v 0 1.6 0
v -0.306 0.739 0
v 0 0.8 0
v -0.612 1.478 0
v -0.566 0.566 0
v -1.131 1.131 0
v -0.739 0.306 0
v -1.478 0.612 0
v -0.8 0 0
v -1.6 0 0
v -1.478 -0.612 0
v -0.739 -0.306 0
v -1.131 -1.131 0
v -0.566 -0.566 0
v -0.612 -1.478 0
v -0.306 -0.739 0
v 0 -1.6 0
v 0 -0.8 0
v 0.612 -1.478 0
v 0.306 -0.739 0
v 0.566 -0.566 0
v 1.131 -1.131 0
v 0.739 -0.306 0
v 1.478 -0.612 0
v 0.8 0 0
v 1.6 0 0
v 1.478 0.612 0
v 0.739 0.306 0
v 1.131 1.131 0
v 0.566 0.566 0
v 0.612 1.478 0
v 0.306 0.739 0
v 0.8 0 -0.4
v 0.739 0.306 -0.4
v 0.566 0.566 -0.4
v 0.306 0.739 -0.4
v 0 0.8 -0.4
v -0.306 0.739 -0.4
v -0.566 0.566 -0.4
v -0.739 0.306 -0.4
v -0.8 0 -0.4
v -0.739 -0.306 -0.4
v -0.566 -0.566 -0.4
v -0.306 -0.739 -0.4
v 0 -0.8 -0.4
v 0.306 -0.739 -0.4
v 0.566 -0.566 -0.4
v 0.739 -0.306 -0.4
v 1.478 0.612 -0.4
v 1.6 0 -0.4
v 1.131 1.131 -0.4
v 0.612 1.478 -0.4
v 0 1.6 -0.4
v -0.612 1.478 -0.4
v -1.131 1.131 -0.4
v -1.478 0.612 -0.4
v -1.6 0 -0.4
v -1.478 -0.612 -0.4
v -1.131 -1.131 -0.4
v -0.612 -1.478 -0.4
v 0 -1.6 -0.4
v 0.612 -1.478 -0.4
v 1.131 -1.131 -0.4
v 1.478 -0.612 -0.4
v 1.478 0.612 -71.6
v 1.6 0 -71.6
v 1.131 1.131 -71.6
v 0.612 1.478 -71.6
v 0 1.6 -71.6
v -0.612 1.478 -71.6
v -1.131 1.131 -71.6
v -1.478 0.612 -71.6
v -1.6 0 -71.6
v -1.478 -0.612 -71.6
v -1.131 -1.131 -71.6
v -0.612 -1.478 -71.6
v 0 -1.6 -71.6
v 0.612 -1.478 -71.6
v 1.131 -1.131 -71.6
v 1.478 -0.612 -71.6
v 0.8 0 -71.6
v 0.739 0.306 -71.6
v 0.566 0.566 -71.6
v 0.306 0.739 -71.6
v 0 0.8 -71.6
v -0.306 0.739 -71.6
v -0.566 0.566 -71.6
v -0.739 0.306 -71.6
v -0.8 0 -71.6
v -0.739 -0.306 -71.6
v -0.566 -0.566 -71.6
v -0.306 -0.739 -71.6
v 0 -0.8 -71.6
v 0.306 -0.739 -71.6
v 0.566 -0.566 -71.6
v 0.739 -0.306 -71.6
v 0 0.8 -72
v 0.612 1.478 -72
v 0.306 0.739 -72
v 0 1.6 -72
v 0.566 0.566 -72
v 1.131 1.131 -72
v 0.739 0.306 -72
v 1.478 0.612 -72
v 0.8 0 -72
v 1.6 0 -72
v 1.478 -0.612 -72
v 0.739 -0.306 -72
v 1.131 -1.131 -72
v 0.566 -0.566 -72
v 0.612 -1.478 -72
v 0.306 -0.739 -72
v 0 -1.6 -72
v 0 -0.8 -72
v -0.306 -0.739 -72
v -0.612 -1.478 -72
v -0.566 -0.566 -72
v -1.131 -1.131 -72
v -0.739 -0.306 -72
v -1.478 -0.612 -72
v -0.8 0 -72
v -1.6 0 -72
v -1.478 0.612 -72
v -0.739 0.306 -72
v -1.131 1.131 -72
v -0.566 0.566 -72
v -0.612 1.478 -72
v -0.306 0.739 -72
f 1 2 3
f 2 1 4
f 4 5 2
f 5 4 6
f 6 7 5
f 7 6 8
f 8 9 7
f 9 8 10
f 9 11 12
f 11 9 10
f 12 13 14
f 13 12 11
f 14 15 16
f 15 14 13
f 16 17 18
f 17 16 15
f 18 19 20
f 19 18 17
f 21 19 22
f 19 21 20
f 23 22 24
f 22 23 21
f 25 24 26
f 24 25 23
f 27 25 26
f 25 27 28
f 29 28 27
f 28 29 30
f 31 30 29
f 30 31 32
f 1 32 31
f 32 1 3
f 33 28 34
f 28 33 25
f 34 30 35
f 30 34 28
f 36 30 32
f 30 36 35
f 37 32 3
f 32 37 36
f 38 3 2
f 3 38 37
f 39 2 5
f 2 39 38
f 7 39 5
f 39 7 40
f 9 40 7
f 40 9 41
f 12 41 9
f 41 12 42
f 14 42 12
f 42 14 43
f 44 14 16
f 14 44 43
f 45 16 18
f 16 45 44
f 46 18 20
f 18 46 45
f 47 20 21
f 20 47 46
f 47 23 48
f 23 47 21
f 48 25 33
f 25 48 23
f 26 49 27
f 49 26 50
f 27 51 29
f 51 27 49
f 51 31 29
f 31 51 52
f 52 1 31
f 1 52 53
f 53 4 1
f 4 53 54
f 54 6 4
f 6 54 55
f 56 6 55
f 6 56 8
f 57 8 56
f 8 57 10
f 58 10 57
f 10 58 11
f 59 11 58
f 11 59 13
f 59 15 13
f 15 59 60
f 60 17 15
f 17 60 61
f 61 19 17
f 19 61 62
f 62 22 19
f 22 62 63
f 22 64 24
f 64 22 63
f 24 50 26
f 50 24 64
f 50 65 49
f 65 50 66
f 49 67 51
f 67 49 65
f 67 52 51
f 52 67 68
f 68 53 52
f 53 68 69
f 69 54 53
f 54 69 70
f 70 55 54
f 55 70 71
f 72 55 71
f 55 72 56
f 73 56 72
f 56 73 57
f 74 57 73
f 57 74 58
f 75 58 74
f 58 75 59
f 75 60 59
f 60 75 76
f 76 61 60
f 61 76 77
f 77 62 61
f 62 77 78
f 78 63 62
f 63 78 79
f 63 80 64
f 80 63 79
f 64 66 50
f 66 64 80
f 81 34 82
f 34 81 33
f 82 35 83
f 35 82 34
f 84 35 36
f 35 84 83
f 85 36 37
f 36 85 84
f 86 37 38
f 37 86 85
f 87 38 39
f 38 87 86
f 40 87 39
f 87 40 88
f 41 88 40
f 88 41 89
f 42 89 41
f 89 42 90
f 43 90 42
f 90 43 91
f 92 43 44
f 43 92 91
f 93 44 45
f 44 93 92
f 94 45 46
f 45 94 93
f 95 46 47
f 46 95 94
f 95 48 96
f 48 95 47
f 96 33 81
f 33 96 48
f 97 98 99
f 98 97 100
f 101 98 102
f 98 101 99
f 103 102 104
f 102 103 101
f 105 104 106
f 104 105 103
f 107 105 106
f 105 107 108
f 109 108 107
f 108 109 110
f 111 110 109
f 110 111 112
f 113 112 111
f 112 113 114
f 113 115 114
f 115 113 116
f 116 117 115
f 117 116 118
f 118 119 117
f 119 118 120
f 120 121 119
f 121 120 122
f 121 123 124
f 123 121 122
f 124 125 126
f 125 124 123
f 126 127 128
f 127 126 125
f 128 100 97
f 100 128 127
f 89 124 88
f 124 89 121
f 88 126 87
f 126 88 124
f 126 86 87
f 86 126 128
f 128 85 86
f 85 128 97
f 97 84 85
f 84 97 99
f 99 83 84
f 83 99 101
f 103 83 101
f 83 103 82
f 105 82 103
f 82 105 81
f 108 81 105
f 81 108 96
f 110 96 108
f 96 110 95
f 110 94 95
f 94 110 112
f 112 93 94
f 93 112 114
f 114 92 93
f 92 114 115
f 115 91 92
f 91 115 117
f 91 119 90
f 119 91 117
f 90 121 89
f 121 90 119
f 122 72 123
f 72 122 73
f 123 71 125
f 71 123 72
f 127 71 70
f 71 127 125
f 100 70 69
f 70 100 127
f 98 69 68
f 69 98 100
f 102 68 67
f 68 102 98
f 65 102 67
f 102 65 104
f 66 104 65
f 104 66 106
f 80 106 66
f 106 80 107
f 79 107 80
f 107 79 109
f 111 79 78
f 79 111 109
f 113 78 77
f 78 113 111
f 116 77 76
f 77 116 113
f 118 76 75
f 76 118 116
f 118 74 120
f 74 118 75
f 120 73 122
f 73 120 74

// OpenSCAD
// file: ../p/4-4ring1.scad
use <../lib.scad>
function ldraw_lib__4_4ring1() = [
// 0 Ring  1 x 1.0
// 0 Name: 4-4ring1.dat
// 0 Author: James Jessiman
// 0 !LDRAW_ORG Primitive UPDATE 2009-01
// 0 !LICENSE Licensed under CC BY 2.0 and CC BY 4.0 : see CAreadme.txt
// 
// 0 BFC CERTIFY CCW
  [0,"BFC","CERTIFY"],
  [0,"BFC","CCW"],
// 
// 0 !HISTORY 1998-12-15 [PTadmin] Official Update 1998-10
// 0 !HISTORY 2002-04-08 [BrickCaster] Modified for BFC compliance
// 0 !HISTORY 2002-04-25 [PTadmin] Official Update 2002-02
// 0 !HISTORY 2007-06-24 [PTadmin] Header formatted for Contributor Agreement
// 0 !HISTORY 2008-07-01 [PTadmin] Official Update 2008-01
// 0 !HISTORY 2008-08-26 [cwdee] Switch polygon winding and rename
// 0 !HISTORY 2009-05-02 [PTadmin] Official Update 2009-01
// 
// 
// 4 16 -0.7654 0 1.8478 -0.3827 0 0.9239 0 0 1 0 0 2
  [4,16,-0.7654,0,1.8478,-0.3827,0,0.9239,0,0,1,0,0,2],
// 4 16 -1.4142 0 1.4142 -0.7071 0 0.7071 -0.3827 0 0.9239 -0.7654 0 1.8478
  [4,16,-1.4142,0,1.4142,-0.7071,0,0.7071,-0.3827,0,0.9239,-0.7654,0,1.8478],
// 4 16 -1.8478 0 0.7654 -0.9239 0 0.3827 -0.7071 0 0.7071 -1.4142 0 1.41420
  [4,16,-1.8478,0,0.7654,-0.9239,0,0.3827,-0.7071,0,0.7071,-1.4142,0,1.41420],
// 4 16 -2 0 0 -1 0 0 -0.9239 0 0.3827 -1.8478 0 0.7654
  [4,16,-2,0,0,-1,0,0,-0.9239,0,0.3827,-1.8478,0,0.7654],
// 4 16 -1.8478 0 -0.7654 -0.9239 0 -0.3827 -1 0 0 -2 0 0
  [4,16,-1.8478,0,-0.7654,-0.9239,0,-0.3827,-1,0,0,-2,0,0],
// 4 16 -1.4142 0 -1.4142 -0.7071 0 -0.7071 -0.9239 0 -0.3827 -1.8478 0 -0.7654
  [4,16,-1.4142,0,-1.4142,-0.7071,0,-0.7071,-0.9239,0,-0.3827,-1.8478,0,-0.7654],
// 4 16 -0.7654 0 -1.8478 -0.3827 0 -0.9239 -0.7071 0 -0.7071 -1.4142 0 -1.4142
  [4,16,-0.7654,0,-1.8478,-0.3827,0,-0.9239,-0.7071,0,-0.7071,-1.4142,0,-1.4142],
// 4 16 0 0 -2 0 0 -1 -0.3827 0 -0.9239 -0.7654 0 -1.8478
  [4,16,0,0,-2,0,0,-1,-0.3827,0,-0.9239,-0.7654,0,-1.8478],
// 4 16 0.7654 0 -1.8478 0.3827 0 -0.9239 0 0 -1 0 0 -2
  [4,16,0.7654,0,-1.8478,0.3827,0,-0.9239,0,0,-1,0,0,-2],
// 4 16 1.4142 0 -1.4142 0.7071 0 -0.7071 0.3827 0 -0.9239 0.7654 0 -1.8478
  [4,16,1.4142,0,-1.4142,0.7071,0,-0.7071,0.3827,0,-0.9239,0.7654,0,-1.8478],
// 4 16 1.8478 0 -0.7654 0.9239 0 -0.3827 0.7071 0 -0.7071 1.4142 0 -1.4142
  [4,16,1.8478,0,-0.7654,0.9239,0,-0.3827,0.7071,0,-0.7071,1.4142,0,-1.4142],
// 4 16 2 0 0 1 0 0 0.9239 0 -0.3827 1.8478 0 -0.7654
  [4,16,2,0,0,1,0,0,0.9239,0,-0.3827,1.8478,0,-0.7654],
// 4 16 1.8478 0 0.7654 0.9239 0 0.3827 1 0 0 2 0 0
  [4,16,1.8478,0,0.7654,0.9239,0,0.3827,1,0,0,2,0,0],
// 4 16 1.4142 0 1.4142 0.7071 0 0.7071 0.9239 0 0.3827 1.8478 0 0.7654
  [4,16,1.4142,0,1.4142,0.7071,0,0.7071,0.9239,0,0.3827,1.8478,0,0.7654],
// 4 16 0.7654 0 1.8478 0.3827 0 0.9239 0.7071 0 0.7071 1.4142 0 1.4142
  [4,16,0.7654,0,1.8478,0.3827,0,0.9239,0.7071,0,0.7071,1.4142,0,1.4142],
// 4 16 0 0 2 0 0 1 0.3827 0 0.9239 0.7654 0 1.8478
  [4,16,0,0,2,0,0,1,0.3827,0,0.9239,0.7654,0,1.8478],
// 0
];
module ldraw_lib__4_4ring1(step=0, col=false, unit=2/5, alt=false, line=0.2, solid=!$preview)
    makepoly(ldraw_lib__4_4ring1(), step=step, col=col, unit=unit, alt=alt, line=line, solid=solid);
ldraw_lib__4_4ring1(line=0.2);
// file: ../p/4-4edge.scad
use <../lib.scad>
function ldraw_lib__4_4edge() = [
// 0 Circle 1.0
// 0 Name: 4-4edge.dat
// 0 Author: James Jessiman
// 0 !LDRAW_ORG Primitive UPDATE 2017-01
// 0 !LICENSE Licensed under CC BY 2.0 and CC BY 4.0 : see CAreadme.txt
// 
// 0 BFC CERTIFY CCW
  [0,"BFC","CERTIFY"],
  [0,"BFC","CCW"],
// 
// 0 !HISTORY 1998-12-15 [PTadmin] Official Update 1998-10
// 0 !HISTORY 2005-12-28 [PTadmin] Official Update 2005-01
// 0 !HISTORY 2007-06-24 [PTadmin] Header formatted for Contributor Agreement
// 0 !HISTORY 2008-07-01 [PTadmin] Official Update 2008-01
// 0 !HISTORY 2017-01-15 [Steffen] BFCed
// 0 !HISTORY 2017-12-30 [PTadmin] Official Update 2017-01
// 
// 
// 2 24 1 0 0 0.9239 0 0.3827
  [2,24,1,0,0,0.9239,0,0.3827],
// 2 24 0.9239 0 0.3827 0.7071 0 0.7071
  [2,24,0.9239,0,0.3827,0.7071,0,0.7071],
// 2 24 0.7071 0 0.7071 0.3827 0 0.9239
  [2,24,0.7071,0,0.7071,0.3827,0,0.9239],
// 2 24 0.3827 0 0.9239 0 0 1
  [2,24,0.3827,0,0.9239,0,0,1],
// 2 24 0 0 1 -0.3827 0 0.9239
  [2,24,0,0,1,-0.3827,0,0.9239],
// 2 24 -0.3827 0 0.9239 -0.7071 0 0.7071
  [2,24,-0.3827,0,0.9239,-0.7071,0,0.7071],
// 2 24 -0.7071 0 0.7071 -0.9239 0 0.3827
  [2,24,-0.7071,0,0.7071,-0.9239,0,0.3827],
// 2 24 -0.9239 0 0.3827 -1 0 -0
  [2,24,-0.9239,0,0.3827,-1,0,-0],
// 2 24 -1 0 -0 -0.9239 0 -0.3827
  [2,24,-1,0,-0,-0.9239,0,-0.3827],
// 2 24 -0.9239 0 -0.3827 -0.7071 0 -0.7071
  [2,24,-0.9239,0,-0.3827,-0.7071,0,-0.7071],
// 2 24 -0.7071 0 -0.7071 -0.3827 0 -0.9239
  [2,24,-0.7071,0,-0.7071,-0.3827,0,-0.9239],
// 2 24 -0.3827 0 -0.9239 0 0 -1
  [2,24,-0.3827,0,-0.9239,0,0,-1],
// 2 24 0 0 -1 0.3827 0 -0.9239
  [2,24,0,0,-1,0.3827,0,-0.9239],
// 2 24 0.3827 0 -0.9239 0.7071 0 -0.7071
  [2,24,0.3827,0,-0.9239,0.7071,0,-0.7071],
// 2 24 0.7071 0 -0.7071 0.9239 0 -0.3827
  [2,24,0.7071,0,-0.7071,0.9239,0,-0.3827],
// 2 24 0.9239 0 -0.3827 1 0 0
  [2,24,0.9239,0,-0.3827,1,0,0],
];
module ldraw_lib__4_4edge(step=0, col=false, unit=2/5, alt=false, line=0.2, solid=!$preview)
    makepoly(ldraw_lib__4_4edge(), step=step, col=col, unit=unit, alt=alt, line=line, solid=solid);
ldraw_lib__4_4edge(line=0.2);
// file: ../p/4-4cyli.scad
use <../lib.scad>
function ldraw_lib__4_4cyli() = [
// 0 Cylinder 1.0
// 0 Name: 4-4cyli.dat
// 0 Author: James Jessiman
// 0 !LDRAW_ORG Primitive UPDATE 2005-01
// 0 !LICENSE Licensed under CC BY 2.0 and CC BY 4.0 : see CAreadme.txt
// 
// 0 BFC CERTIFY CCW
  [0,"BFC","CERTIFY"],
  [0,"BFC","CCW"],
// 
// 0 !HISTORY 1998-12-15 [PTadmin] Official Update 1998-10
// 0 !HISTORY 2002-03-23 [sbliss] Added BFC statement; merged headers from files in distributions LDraw 0.27 and Complete.
// 0 !HISTORY 2002-04-25 [PTadmin] Official Update 2002-02
// 0 !HISTORY 2004-12-14 [guyvivan] BFC CCW
// 0 !HISTORY 2005-12-28 [PTadmin] Official Update 2005-01
// 0 !HISTORY 2007-06-24 [PTadmin] Header formatted for Contributor Agreement
// 0 !HISTORY 2008-07-01 [PTadmin] Official Update 2008-01
// 
// 
// 4 16 1 1 0 0.9239 1 0.3827 0.9239 0 0.3827 1 0 0
  [4,16,1,1,0,0.9239,1,0.3827,0.9239,0,0.3827,1,0,0],
// 5 24 1 0 0 1 1 0 0.9239 0 0.3827 0.9239 0 -0.3827
  [5,24,1,0,0,1,1,0,0.9239,0,0.3827,0.9239,0,-0.3827],
// 4 16 0.9239 1 0.3827 0.7071 1 0.7071 0.7071 0 0.7071 0.9239 0 0.3827
  [4,16,0.9239,1,0.3827,0.7071,1,0.7071,0.7071,0,0.7071,0.9239,0,0.3827],
// 5 24 0.9239 0 0.3827 0.9239 1 0.3827 0.7071 0 0.7071 1 0 0
  [5,24,0.9239,0,0.3827,0.9239,1,0.3827,0.7071,0,0.7071,1,0,0],
// 4 16 0.7071 1 0.7071 0.3827 1 0.9239 0.3827 0 0.9239 0.7071 0 0.7071
  [4,16,0.7071,1,0.7071,0.3827,1,0.9239,0.3827,0,0.9239,0.7071,0,0.7071],
// 5 24 0.7071 0 0.7071 0.7071 1 0.7071 0.3827 0 0.9239 0.9239 0 0.3827
  [5,24,0.7071,0,0.7071,0.7071,1,0.7071,0.3827,0,0.9239,0.9239,0,0.3827],
// 4 16 0.3827 1 0.9239 0 1 1 0 0 1 0.3827 0 0.9239
  [4,16,0.3827,1,0.9239,0,1,1,0,0,1,0.3827,0,0.9239],
// 5 24 0.3827 0 0.9239 0.3827 1 0.9239 0 0 1 0.7071 0 0.7071
  [5,24,0.3827,0,0.9239,0.3827,1,0.9239,0,0,1,0.7071,0,0.7071],
// 4 16 0 1 1 -0.3827 1 0.9239 -0.3827 0 0.9239 0 0 1
  [4,16,0,1,1,-0.3827,1,0.9239,-0.3827,0,0.9239,0,0,1],
// 5 24 0 0 1 0 1 1 -0.3827 0 0.9239 0.3827 0 0.9239
  [5,24,0,0,1,0,1,1,-0.3827,0,0.9239,0.3827,0,0.9239],
// 4 16 -0.3827 1 0.9239 -0.7071 1 0.7071 -0.7071 0 0.7071 -0.3827 0 0.9239
  [4,16,-0.3827,1,0.9239,-0.7071,1,0.7071,-0.7071,0,0.7071,-0.3827,0,0.9239],
// 5 24 -0.3827 0 0.9239 -0.3827 1 0.9239 -0.7071 0 0.7071 0 0 1
  [5,24,-0.3827,0,0.9239,-0.3827,1,0.9239,-0.7071,0,0.7071,0,0,1],
// 4 16 -0.7071 1 0.7071 -0.9239 1 0.3827 -0.9239 0 0.3827 -0.7071 0 0.7071
  [4,16,-0.7071,1,0.7071,-0.9239,1,0.3827,-0.9239,0,0.3827,-0.7071,0,0.7071],
// 5 24 -0.7071 0 0.7071 -0.7071 1 0.7071 -0.9239 0 0.3827 -0.3827 0 0.9239
  [5,24,-0.7071,0,0.7071,-0.7071,1,0.7071,-0.9239,0,0.3827,-0.3827,0,0.9239],
// 4 16 -0.9239 1 0.3827 -1 1 0 -1 0 0 -0.9239 0 0.3827
  [4,16,-0.9239,1,0.3827,-1,1,0,-1,0,0,-0.9239,0,0.3827],
// 5 24 -0.9239 0 0.3827 -0.9239 1 0.3827 -1 0 0 -0.7071 0 0.7071
  [5,24,-0.9239,0,0.3827,-0.9239,1,0.3827,-1,0,0,-0.7071,0,0.7071],
// 4 16 -1 1 0 -0.9239 1 -0.3827 -0.9239 0 -0.3827 -1 0 0
  [4,16,-1,1,0,-0.9239,1,-0.3827,-0.9239,0,-0.3827,-1,0,0],
// 5 24 -1 0 0 -1 1 0 -0.9239 0 -0.3827 -0.9239 0 0.3827
  [5,24,-1,0,0,-1,1,0,-0.9239,0,-0.3827,-0.9239,0,0.3827],
// 4 16 -0.9239 1 -0.3827 -0.7071 1 -0.7071 -0.7071 0 -0.7071 -0.9239 0 -0.3827
  [4,16,-0.9239,1,-0.3827,-0.7071,1,-0.7071,-0.7071,0,-0.7071,-0.9239,0,-0.3827],
// 5 24 -0.9239 0 -0.3827 -0.9239 1 -0.3827 -0.7071 0 -0.7071 -1 0 0
  [5,24,-0.9239,0,-0.3827,-0.9239,1,-0.3827,-0.7071,0,-0.7071,-1,0,0],
// 4 16 -0.7071 1 -0.7071 -0.3827 1 -0.9239 -0.3827 0 -0.9239 -0.7071 0 -0.7071
  [4,16,-0.7071,1,-0.7071,-0.3827,1,-0.9239,-0.3827,0,-0.9239,-0.7071,0,-0.7071],
// 5 24 -0.7071 0 -0.7071 -0.7071 1 -0.7071 -0.3827 0 -0.9239 -0.9239 0 -0.3827
  [5,24,-0.7071,0,-0.7071,-0.7071,1,-0.7071,-0.3827,0,-0.9239,-0.9239,0,-0.3827],
// 4 16 -0.3827 1 -0.9239 0 1 -1 0 0 -1 -0.3827 0 -0.9239
  [4,16,-0.3827,1,-0.9239,0,1,-1,0,0,-1,-0.3827,0,-0.9239],
// 5 24 -0.3827 0 -0.9239 -0.3827 1 -0.9239 0 0 -1 -0.7071 0 -0.7071
  [5,24,-0.3827,0,-0.9239,-0.3827,1,-0.9239,0,0,-1,-0.7071,0,-0.7071],
// 4 16 0 1 -1 0.3827 1 -0.9239 0.3827 0 -0.9239 0 0 -1
  [4,16,0,1,-1,0.3827,1,-0.9239,0.3827,0,-0.9239,0,0,-1],
// 5 24 0 0 -1 0 1 -1 0.3827 0 -0.9239 -0.3827 0 -0.9239
  [5,24,0,0,-1,0,1,-1,0.3827,0,-0.9239,-0.3827,0,-0.9239],
// 4 16 0.3827 1 -0.9239 0.7071 1 -0.7071 0.7071 0 -0.7071 0.3827 0 -0.9239
  [4,16,0.3827,1,-0.9239,0.7071,1,-0.7071,0.7071,0,-0.7071,0.3827,0,-0.9239],
// 5 24 0.3827 0 -0.9239 0.3827 1 -0.9239 0.7071 0 -0.7071 0 0 -1
  [5,24,0.3827,0,-0.9239,0.3827,1,-0.9239,0.7071,0,-0.7071,0,0,-1],
// 4 16 0.7071 1 -0.7071 0.9239 1 -0.3827 0.9239 0 -0.3827 0.7071 0 -0.7071
  [4,16,0.7071,1,-0.7071,0.9239,1,-0.3827,0.9239,0,-0.3827,0.7071,0,-0.7071],
// 5 24 0.7071 0 -0.7071 0.7071 1 -0.7071 0.9239 0 -0.3827 0.3827 0 -0.9239
  [5,24,0.7071,0,-0.7071,0.7071,1,-0.7071,0.9239,0,-0.3827,0.3827,0,-0.9239],
// 4 16 0.9239 1 -0.3827 1 1 0 1 0 0 0.9239 0 -0.3827
  [4,16,0.9239,1,-0.3827,1,1,0,1,0,0,0.9239,0,-0.3827],
// 5 24 0.9239 0 -0.3827 0.9239 1 -0.3827 1 0 0 0.7071 0 -0.7071
  [5,24,0.9239,0,-0.3827,0.9239,1,-0.3827,1,0,0,0.7071,0,-0.7071],
// 0
];
module ldraw_lib__4_4cyli(step=0, col=false, unit=2/5, alt=false, line=0.2, solid=!$preview)
    makepoly(ldraw_lib__4_4cyli(), step=step, col=col, unit=unit, alt=alt, line=line, solid=solid);
ldraw_lib__4_4cyli(line=0.2);
// file: u9053.scad
use <../lib.scad>
use <../p/4-4cyli.scad>
use <../p/4-4edge.scad>
use <../p/4-4ring1.scad>
function ldraw_lib__u9053() = [
// 0 ~Technic Flex-System Hose End
// 0 Name: u9053.dat
// 0 Author: William Howard [WilliamH]
// 0 !LDRAW_ORG Part UPDATE 2011-02
// 0 !LICENSE Licensed under CC BY 2.0 and CC BY 4.0 : see CAreadme.txt
// 
// 0 BFC CERTIFY CCW
  [0,"BFC","CERTIFY"],
  [0,"BFC","CCW"],
// 
// 0 !HISTORY 2011-12-21 [cwdee] Reworked subparting technique
// 0 !HISTORY 2011-12-23 [PTadmin] Renamed from 76
// 0 !HISTORY 2011-12-29 [PTadmin] Official Update 2011-02
// 
// 
// 1 16 0 0 0 2 0 0 0 1 0 0 0 2 4-4ring1.dat
  [1,16,0,0,0,2,0,0,0,1,0,0,0,2, ldraw_lib__4_4ring1()],
// 1 16 0 0 0 2 0 0 0 1 0 0 0 2 4-4edge.dat
  [1,16,0,0,0,2,0,0,0,1,0,0,0,2, ldraw_lib__4_4edge()],
// 0 BFC INVERTNEXT
  [0,"BFC","INVERTNEXT"],
// 1 16 0 0 0 2 0 0 0 1 0 0 0 2 4-4cyli.dat
  [1,16,0,0,0,2,0,0,0,1,0,0,0,2, ldraw_lib__4_4cyli()],
// 1 16 0 0 0 4 0 0 0 1 0 0 0 4 4-4edge.dat
  [1,16,0,0,0,4,0,0,0,1,0,0,0,4, ldraw_lib__4_4edge()],
// 1 16 0 0 0 4 0 0 0 1 0 0 0 4 4-4cyli.dat
  [1,16,0,0,0,4,0,0,0,1,0,0,0,4, ldraw_lib__4_4cyli()],
// 0
];
module ldraw_lib__u9053(step=0, col=false, unit=2/5, alt=false, line=0.2, solid=!$preview)
    makepoly(ldraw_lib__u9053(), step=step, col=col, unit=unit, alt=alt, line=line, solid=solid);
ldraw_lib__u9053(line=0.2);
// file: 77.scad
use <../lib.scad>
use <../p/4-4cyli.scad>
function ldraw_lib__77() = [
// 0 ~Technic Flex-System Hose Segment
// 0 Name: 77.dat
// 0 Author: William Howard [WilliamH]
// 0 !LDRAW_ORG Part UPDATE 2011-02
// 0 !LICENSE Licensed under CC BY 2.0 and CC BY 4.0 : see CAreadme.txt
// 
// 0 BFC CERTIFY CCW
  [0,"BFC","CERTIFY"],
  [0,"BFC","CCW"],
// 
// 0 !HISTORY 2011-12-21 [cwdee] Reworked subparting technique
// 0 !HISTORY 2011-12-29 [PTadmin] Official Update 2011-02
// 
// 
// 1 16 0 0 0 4 0 0 0 1 0 0 0 4 4-4cyli.dat
  [1,16,0,0,0,4,0,0,0,1,0,0,0,4, ldraw_lib__4_4cyli()],
// 0 BFC INVERTNEXT
  [0,"BFC","INVERTNEXT"],
// 1 16 0 0 0 2 0 0 0 1 0 0 0 2 4-4cyli.dat
  [1,16,0,0,0,2,0,0,0,1,0,0,0,2, ldraw_lib__4_4cyli()],
// 0
];
module ldraw_lib__77(step=0, col=false, unit=2/5, alt=false, line=0.2, solid=!$preview)
    makepoly(ldraw_lib__77(), step=step, col=col, unit=unit, alt=alt, line=line, solid=solid);
ldraw_lib__77(line=0.2);
// main file
use <../lib.scad>
use <77.scad>
use <u9053.scad>
function ldraw_lib__76324() = [
// 0 Technic Flex-System Hose  9L (180LDU)
// 0 Name: 76324.dat
// 0 Author: Tim Gould [timgould]
// 0 !LDRAW_ORG Part UPDATE 2011-02
// 0 !LICENSE Licensed under CC BY 2.0 and CC BY 4.0 : see CAreadme.txt
// 
// 0 BFC CERTIFY CCW
  [0,"BFC","CERTIFY"],
  [0,"BFC","CCW"],
// 
// 0 !KEYWORDS bar, tube
// 
// 0 !HISTORY 2011-12-29 [PTadmin] Official Update 2011-02
// 
// 
// 1 16 0 0 0 1 0 0 0 1 0 0 0 1 u9053.dat
  [1,16,0,0,0,1,0,0,0,1,0,0,0,1, ldraw_lib__u9053()],
// 1 16 0 1 0 1 0 0 0 178 0 0 0 1 77.dat
  [1,16,0,1,0,1,0,0,0,178,0,0,0,1, ldraw_lib__77()],
// 1 16 0 180 0 -1 0 0 0 -1 0 0 0 1 u9053.dat
  [1,16,0,180,0,-1,0,0,0,-1,0,0,0,1, ldraw_lib__u9053()],
];
module ldraw_lib__76324(step=0, col=false, unit=2/5, alt=false, line=0.2, solid=!$preview)
    makepoly(ldraw_lib__76324(), step=step, col=col, unit=unit, alt=alt, line=line, solid=solid);
ldraw_lib__76324(line=0.2);
